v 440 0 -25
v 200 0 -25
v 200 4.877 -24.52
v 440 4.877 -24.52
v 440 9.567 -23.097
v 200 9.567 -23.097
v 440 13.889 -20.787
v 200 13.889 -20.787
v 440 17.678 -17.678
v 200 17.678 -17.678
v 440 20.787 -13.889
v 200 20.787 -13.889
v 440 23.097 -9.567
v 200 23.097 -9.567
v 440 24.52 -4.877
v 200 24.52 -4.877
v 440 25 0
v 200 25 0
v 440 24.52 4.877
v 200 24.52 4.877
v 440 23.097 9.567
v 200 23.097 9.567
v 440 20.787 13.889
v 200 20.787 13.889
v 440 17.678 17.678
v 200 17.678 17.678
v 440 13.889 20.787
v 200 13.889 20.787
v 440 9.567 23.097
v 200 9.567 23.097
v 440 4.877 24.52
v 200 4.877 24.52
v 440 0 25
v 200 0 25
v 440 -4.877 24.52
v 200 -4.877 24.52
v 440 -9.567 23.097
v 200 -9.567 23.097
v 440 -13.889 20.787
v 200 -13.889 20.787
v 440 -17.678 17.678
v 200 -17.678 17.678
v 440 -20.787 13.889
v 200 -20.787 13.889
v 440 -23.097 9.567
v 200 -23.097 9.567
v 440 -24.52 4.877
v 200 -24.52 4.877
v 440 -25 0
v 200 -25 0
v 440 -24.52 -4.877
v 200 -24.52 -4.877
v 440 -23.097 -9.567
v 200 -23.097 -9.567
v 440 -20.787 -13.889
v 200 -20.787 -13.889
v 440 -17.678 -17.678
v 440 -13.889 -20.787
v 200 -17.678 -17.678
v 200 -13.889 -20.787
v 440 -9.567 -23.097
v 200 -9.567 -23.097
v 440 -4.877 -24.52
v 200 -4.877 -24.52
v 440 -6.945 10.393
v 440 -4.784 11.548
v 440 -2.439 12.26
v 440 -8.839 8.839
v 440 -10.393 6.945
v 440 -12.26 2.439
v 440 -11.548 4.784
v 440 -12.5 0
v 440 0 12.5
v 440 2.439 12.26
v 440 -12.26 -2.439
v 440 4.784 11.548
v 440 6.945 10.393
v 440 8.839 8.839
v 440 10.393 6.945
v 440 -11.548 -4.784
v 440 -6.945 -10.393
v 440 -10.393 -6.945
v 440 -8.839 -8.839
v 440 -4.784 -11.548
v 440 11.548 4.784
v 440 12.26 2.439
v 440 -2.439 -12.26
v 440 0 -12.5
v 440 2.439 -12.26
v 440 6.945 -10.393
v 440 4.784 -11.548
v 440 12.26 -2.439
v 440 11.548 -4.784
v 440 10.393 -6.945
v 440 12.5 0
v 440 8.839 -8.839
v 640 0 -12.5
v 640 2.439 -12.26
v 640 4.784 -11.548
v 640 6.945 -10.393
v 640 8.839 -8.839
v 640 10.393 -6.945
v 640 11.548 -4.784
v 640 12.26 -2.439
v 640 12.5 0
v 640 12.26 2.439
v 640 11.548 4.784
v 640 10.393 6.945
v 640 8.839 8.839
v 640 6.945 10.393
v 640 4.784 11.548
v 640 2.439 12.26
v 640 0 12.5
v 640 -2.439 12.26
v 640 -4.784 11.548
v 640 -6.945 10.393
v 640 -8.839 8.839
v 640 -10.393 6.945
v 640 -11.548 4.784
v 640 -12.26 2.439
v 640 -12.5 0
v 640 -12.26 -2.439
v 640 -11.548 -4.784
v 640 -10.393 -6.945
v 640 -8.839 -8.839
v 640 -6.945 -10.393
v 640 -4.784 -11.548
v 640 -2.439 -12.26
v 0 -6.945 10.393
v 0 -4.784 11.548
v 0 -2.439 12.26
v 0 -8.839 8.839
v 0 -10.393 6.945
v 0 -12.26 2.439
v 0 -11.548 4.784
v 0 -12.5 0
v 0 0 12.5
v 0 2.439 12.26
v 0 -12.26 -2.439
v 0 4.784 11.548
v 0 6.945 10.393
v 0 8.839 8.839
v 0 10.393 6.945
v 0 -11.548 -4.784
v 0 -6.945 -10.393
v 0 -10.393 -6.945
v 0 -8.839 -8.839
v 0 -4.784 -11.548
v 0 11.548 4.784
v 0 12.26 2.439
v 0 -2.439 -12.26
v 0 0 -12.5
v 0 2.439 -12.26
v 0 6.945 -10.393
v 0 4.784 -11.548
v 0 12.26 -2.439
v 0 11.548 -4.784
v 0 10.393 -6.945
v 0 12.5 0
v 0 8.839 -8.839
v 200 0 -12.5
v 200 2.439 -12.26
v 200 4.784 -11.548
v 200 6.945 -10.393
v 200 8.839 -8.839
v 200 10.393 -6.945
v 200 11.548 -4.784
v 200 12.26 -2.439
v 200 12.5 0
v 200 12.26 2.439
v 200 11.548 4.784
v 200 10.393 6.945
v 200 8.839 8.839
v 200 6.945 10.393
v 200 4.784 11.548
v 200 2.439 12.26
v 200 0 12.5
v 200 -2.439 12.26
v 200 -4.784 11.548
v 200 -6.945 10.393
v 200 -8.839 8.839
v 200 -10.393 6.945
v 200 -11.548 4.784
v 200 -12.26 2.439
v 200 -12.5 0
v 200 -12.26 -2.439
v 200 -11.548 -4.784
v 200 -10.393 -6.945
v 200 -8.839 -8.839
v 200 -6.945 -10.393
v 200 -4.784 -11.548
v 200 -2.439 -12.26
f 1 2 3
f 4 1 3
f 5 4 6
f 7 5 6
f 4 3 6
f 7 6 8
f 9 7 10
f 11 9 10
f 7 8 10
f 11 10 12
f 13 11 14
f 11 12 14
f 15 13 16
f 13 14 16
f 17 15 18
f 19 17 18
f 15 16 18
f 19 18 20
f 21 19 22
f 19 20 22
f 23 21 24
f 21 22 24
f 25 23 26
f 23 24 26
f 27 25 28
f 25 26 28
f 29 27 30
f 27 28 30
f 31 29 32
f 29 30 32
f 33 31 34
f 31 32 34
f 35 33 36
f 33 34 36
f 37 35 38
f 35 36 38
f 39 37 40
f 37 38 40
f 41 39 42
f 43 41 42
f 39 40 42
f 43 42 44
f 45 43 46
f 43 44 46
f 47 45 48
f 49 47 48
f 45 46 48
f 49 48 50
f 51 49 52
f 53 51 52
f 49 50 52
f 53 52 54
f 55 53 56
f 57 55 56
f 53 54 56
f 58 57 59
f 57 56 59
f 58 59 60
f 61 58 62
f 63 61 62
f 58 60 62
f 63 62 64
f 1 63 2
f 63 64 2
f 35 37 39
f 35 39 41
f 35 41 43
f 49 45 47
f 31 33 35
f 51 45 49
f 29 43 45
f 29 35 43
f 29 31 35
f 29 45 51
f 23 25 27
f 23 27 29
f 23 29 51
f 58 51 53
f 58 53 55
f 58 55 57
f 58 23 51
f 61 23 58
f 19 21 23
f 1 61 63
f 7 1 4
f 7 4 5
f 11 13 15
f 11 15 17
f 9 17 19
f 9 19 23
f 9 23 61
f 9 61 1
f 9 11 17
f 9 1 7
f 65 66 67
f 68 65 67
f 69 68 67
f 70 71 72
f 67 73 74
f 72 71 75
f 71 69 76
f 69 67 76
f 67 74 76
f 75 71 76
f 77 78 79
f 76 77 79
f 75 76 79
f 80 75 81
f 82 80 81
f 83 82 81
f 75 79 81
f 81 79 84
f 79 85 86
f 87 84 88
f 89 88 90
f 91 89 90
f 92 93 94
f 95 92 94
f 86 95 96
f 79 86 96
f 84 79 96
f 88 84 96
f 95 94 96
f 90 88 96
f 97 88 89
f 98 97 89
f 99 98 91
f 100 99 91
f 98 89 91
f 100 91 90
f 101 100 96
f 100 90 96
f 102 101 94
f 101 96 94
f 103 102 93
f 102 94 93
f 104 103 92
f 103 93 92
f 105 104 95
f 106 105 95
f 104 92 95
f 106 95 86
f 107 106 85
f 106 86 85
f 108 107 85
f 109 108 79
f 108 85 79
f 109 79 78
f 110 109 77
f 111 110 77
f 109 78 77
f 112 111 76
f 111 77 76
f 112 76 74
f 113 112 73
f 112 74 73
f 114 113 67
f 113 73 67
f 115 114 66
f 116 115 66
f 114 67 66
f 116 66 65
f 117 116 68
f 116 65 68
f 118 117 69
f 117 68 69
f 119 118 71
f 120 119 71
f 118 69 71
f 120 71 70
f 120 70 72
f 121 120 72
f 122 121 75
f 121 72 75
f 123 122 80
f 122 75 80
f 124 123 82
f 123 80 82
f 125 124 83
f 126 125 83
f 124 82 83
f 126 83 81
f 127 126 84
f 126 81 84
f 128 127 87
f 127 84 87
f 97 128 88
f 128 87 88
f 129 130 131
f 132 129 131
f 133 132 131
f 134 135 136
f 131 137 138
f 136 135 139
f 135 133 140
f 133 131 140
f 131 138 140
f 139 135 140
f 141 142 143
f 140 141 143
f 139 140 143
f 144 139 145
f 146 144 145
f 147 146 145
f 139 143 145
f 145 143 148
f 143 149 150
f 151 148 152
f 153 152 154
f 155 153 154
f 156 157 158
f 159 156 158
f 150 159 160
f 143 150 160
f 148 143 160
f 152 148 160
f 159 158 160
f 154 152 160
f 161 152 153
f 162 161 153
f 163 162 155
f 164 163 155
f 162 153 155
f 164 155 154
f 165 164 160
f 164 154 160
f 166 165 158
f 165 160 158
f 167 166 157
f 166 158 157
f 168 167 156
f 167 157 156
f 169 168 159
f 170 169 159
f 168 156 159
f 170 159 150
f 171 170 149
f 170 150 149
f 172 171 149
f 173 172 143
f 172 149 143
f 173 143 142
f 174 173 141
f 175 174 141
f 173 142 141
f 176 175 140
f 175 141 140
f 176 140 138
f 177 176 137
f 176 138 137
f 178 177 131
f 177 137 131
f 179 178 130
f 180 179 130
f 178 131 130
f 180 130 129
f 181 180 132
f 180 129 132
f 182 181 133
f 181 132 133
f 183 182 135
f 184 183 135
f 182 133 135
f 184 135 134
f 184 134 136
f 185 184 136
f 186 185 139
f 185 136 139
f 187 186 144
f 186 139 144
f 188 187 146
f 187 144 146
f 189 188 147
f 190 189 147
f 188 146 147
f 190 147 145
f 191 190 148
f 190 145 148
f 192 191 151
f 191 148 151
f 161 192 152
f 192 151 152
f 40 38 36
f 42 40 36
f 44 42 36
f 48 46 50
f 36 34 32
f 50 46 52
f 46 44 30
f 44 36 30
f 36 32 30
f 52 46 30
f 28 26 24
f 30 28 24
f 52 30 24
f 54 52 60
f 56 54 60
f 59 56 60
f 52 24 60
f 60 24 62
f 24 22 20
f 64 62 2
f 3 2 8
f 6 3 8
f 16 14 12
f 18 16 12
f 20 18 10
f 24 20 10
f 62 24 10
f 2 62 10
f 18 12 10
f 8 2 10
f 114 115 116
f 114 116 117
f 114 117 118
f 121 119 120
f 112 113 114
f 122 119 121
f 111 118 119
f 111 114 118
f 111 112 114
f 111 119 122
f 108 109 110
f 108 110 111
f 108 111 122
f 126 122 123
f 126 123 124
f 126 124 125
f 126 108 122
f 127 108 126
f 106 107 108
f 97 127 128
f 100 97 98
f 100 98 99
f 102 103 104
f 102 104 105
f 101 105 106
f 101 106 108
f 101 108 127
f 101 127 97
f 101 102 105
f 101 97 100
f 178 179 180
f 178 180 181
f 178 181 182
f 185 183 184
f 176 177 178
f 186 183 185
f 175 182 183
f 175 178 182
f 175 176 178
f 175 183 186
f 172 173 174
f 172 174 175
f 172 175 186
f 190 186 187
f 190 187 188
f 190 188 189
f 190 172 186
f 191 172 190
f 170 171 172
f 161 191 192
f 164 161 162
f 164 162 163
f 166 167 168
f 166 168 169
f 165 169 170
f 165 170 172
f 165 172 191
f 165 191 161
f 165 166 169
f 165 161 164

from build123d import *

# Parameters (mm, degrees)
SKETCH2_R            = 12.5
BOSS_EXTRUDEAB_DEPTH = 200
SKETCH3_R            = 25
BOSS_EXTRUDEBC_DEPTH = 240
SKETCH4_R            = 12.5
BOSS_EXTRUDECD_DEPTH = 200


with BuildPart() as part:
    # Sketch2 → Boss-ExtrudeAB (new body)
    with BuildSketch(Plane(origin=(0, 0, 0), x_dir=(0, 0, -1), z_dir=(1, 0, 0))):
        Circle(SKETCH2_R)
    extrude(amount=BOSS_EXTRUDEAB_DEPTH)


with BuildPart() as body_2:
    # Sketch3 → Boss-ExtrudeBC (new body)
    with BuildSketch(Plane(origin=(200, 0, 0), x_dir=(0, 0, -1), z_dir=(1, 0, 0))):
        Circle(SKETCH3_R)
    extrude(amount=BOSS_EXTRUDEBC_DEPTH)


with BuildPart() as body_3:
    # Sketch4 → Boss-ExtrudeCD (new body)
    with BuildSketch(Plane(origin=(440, 0, 0), x_dir=(0, 0, -1), z_dir=(1, 0, 0))):
        Circle(SKETCH4_R)
    extrude(amount=BOSS_EXTRUDECD_DEPTH)


solid = Compound([part.part, body_2.part, body_3.part])
